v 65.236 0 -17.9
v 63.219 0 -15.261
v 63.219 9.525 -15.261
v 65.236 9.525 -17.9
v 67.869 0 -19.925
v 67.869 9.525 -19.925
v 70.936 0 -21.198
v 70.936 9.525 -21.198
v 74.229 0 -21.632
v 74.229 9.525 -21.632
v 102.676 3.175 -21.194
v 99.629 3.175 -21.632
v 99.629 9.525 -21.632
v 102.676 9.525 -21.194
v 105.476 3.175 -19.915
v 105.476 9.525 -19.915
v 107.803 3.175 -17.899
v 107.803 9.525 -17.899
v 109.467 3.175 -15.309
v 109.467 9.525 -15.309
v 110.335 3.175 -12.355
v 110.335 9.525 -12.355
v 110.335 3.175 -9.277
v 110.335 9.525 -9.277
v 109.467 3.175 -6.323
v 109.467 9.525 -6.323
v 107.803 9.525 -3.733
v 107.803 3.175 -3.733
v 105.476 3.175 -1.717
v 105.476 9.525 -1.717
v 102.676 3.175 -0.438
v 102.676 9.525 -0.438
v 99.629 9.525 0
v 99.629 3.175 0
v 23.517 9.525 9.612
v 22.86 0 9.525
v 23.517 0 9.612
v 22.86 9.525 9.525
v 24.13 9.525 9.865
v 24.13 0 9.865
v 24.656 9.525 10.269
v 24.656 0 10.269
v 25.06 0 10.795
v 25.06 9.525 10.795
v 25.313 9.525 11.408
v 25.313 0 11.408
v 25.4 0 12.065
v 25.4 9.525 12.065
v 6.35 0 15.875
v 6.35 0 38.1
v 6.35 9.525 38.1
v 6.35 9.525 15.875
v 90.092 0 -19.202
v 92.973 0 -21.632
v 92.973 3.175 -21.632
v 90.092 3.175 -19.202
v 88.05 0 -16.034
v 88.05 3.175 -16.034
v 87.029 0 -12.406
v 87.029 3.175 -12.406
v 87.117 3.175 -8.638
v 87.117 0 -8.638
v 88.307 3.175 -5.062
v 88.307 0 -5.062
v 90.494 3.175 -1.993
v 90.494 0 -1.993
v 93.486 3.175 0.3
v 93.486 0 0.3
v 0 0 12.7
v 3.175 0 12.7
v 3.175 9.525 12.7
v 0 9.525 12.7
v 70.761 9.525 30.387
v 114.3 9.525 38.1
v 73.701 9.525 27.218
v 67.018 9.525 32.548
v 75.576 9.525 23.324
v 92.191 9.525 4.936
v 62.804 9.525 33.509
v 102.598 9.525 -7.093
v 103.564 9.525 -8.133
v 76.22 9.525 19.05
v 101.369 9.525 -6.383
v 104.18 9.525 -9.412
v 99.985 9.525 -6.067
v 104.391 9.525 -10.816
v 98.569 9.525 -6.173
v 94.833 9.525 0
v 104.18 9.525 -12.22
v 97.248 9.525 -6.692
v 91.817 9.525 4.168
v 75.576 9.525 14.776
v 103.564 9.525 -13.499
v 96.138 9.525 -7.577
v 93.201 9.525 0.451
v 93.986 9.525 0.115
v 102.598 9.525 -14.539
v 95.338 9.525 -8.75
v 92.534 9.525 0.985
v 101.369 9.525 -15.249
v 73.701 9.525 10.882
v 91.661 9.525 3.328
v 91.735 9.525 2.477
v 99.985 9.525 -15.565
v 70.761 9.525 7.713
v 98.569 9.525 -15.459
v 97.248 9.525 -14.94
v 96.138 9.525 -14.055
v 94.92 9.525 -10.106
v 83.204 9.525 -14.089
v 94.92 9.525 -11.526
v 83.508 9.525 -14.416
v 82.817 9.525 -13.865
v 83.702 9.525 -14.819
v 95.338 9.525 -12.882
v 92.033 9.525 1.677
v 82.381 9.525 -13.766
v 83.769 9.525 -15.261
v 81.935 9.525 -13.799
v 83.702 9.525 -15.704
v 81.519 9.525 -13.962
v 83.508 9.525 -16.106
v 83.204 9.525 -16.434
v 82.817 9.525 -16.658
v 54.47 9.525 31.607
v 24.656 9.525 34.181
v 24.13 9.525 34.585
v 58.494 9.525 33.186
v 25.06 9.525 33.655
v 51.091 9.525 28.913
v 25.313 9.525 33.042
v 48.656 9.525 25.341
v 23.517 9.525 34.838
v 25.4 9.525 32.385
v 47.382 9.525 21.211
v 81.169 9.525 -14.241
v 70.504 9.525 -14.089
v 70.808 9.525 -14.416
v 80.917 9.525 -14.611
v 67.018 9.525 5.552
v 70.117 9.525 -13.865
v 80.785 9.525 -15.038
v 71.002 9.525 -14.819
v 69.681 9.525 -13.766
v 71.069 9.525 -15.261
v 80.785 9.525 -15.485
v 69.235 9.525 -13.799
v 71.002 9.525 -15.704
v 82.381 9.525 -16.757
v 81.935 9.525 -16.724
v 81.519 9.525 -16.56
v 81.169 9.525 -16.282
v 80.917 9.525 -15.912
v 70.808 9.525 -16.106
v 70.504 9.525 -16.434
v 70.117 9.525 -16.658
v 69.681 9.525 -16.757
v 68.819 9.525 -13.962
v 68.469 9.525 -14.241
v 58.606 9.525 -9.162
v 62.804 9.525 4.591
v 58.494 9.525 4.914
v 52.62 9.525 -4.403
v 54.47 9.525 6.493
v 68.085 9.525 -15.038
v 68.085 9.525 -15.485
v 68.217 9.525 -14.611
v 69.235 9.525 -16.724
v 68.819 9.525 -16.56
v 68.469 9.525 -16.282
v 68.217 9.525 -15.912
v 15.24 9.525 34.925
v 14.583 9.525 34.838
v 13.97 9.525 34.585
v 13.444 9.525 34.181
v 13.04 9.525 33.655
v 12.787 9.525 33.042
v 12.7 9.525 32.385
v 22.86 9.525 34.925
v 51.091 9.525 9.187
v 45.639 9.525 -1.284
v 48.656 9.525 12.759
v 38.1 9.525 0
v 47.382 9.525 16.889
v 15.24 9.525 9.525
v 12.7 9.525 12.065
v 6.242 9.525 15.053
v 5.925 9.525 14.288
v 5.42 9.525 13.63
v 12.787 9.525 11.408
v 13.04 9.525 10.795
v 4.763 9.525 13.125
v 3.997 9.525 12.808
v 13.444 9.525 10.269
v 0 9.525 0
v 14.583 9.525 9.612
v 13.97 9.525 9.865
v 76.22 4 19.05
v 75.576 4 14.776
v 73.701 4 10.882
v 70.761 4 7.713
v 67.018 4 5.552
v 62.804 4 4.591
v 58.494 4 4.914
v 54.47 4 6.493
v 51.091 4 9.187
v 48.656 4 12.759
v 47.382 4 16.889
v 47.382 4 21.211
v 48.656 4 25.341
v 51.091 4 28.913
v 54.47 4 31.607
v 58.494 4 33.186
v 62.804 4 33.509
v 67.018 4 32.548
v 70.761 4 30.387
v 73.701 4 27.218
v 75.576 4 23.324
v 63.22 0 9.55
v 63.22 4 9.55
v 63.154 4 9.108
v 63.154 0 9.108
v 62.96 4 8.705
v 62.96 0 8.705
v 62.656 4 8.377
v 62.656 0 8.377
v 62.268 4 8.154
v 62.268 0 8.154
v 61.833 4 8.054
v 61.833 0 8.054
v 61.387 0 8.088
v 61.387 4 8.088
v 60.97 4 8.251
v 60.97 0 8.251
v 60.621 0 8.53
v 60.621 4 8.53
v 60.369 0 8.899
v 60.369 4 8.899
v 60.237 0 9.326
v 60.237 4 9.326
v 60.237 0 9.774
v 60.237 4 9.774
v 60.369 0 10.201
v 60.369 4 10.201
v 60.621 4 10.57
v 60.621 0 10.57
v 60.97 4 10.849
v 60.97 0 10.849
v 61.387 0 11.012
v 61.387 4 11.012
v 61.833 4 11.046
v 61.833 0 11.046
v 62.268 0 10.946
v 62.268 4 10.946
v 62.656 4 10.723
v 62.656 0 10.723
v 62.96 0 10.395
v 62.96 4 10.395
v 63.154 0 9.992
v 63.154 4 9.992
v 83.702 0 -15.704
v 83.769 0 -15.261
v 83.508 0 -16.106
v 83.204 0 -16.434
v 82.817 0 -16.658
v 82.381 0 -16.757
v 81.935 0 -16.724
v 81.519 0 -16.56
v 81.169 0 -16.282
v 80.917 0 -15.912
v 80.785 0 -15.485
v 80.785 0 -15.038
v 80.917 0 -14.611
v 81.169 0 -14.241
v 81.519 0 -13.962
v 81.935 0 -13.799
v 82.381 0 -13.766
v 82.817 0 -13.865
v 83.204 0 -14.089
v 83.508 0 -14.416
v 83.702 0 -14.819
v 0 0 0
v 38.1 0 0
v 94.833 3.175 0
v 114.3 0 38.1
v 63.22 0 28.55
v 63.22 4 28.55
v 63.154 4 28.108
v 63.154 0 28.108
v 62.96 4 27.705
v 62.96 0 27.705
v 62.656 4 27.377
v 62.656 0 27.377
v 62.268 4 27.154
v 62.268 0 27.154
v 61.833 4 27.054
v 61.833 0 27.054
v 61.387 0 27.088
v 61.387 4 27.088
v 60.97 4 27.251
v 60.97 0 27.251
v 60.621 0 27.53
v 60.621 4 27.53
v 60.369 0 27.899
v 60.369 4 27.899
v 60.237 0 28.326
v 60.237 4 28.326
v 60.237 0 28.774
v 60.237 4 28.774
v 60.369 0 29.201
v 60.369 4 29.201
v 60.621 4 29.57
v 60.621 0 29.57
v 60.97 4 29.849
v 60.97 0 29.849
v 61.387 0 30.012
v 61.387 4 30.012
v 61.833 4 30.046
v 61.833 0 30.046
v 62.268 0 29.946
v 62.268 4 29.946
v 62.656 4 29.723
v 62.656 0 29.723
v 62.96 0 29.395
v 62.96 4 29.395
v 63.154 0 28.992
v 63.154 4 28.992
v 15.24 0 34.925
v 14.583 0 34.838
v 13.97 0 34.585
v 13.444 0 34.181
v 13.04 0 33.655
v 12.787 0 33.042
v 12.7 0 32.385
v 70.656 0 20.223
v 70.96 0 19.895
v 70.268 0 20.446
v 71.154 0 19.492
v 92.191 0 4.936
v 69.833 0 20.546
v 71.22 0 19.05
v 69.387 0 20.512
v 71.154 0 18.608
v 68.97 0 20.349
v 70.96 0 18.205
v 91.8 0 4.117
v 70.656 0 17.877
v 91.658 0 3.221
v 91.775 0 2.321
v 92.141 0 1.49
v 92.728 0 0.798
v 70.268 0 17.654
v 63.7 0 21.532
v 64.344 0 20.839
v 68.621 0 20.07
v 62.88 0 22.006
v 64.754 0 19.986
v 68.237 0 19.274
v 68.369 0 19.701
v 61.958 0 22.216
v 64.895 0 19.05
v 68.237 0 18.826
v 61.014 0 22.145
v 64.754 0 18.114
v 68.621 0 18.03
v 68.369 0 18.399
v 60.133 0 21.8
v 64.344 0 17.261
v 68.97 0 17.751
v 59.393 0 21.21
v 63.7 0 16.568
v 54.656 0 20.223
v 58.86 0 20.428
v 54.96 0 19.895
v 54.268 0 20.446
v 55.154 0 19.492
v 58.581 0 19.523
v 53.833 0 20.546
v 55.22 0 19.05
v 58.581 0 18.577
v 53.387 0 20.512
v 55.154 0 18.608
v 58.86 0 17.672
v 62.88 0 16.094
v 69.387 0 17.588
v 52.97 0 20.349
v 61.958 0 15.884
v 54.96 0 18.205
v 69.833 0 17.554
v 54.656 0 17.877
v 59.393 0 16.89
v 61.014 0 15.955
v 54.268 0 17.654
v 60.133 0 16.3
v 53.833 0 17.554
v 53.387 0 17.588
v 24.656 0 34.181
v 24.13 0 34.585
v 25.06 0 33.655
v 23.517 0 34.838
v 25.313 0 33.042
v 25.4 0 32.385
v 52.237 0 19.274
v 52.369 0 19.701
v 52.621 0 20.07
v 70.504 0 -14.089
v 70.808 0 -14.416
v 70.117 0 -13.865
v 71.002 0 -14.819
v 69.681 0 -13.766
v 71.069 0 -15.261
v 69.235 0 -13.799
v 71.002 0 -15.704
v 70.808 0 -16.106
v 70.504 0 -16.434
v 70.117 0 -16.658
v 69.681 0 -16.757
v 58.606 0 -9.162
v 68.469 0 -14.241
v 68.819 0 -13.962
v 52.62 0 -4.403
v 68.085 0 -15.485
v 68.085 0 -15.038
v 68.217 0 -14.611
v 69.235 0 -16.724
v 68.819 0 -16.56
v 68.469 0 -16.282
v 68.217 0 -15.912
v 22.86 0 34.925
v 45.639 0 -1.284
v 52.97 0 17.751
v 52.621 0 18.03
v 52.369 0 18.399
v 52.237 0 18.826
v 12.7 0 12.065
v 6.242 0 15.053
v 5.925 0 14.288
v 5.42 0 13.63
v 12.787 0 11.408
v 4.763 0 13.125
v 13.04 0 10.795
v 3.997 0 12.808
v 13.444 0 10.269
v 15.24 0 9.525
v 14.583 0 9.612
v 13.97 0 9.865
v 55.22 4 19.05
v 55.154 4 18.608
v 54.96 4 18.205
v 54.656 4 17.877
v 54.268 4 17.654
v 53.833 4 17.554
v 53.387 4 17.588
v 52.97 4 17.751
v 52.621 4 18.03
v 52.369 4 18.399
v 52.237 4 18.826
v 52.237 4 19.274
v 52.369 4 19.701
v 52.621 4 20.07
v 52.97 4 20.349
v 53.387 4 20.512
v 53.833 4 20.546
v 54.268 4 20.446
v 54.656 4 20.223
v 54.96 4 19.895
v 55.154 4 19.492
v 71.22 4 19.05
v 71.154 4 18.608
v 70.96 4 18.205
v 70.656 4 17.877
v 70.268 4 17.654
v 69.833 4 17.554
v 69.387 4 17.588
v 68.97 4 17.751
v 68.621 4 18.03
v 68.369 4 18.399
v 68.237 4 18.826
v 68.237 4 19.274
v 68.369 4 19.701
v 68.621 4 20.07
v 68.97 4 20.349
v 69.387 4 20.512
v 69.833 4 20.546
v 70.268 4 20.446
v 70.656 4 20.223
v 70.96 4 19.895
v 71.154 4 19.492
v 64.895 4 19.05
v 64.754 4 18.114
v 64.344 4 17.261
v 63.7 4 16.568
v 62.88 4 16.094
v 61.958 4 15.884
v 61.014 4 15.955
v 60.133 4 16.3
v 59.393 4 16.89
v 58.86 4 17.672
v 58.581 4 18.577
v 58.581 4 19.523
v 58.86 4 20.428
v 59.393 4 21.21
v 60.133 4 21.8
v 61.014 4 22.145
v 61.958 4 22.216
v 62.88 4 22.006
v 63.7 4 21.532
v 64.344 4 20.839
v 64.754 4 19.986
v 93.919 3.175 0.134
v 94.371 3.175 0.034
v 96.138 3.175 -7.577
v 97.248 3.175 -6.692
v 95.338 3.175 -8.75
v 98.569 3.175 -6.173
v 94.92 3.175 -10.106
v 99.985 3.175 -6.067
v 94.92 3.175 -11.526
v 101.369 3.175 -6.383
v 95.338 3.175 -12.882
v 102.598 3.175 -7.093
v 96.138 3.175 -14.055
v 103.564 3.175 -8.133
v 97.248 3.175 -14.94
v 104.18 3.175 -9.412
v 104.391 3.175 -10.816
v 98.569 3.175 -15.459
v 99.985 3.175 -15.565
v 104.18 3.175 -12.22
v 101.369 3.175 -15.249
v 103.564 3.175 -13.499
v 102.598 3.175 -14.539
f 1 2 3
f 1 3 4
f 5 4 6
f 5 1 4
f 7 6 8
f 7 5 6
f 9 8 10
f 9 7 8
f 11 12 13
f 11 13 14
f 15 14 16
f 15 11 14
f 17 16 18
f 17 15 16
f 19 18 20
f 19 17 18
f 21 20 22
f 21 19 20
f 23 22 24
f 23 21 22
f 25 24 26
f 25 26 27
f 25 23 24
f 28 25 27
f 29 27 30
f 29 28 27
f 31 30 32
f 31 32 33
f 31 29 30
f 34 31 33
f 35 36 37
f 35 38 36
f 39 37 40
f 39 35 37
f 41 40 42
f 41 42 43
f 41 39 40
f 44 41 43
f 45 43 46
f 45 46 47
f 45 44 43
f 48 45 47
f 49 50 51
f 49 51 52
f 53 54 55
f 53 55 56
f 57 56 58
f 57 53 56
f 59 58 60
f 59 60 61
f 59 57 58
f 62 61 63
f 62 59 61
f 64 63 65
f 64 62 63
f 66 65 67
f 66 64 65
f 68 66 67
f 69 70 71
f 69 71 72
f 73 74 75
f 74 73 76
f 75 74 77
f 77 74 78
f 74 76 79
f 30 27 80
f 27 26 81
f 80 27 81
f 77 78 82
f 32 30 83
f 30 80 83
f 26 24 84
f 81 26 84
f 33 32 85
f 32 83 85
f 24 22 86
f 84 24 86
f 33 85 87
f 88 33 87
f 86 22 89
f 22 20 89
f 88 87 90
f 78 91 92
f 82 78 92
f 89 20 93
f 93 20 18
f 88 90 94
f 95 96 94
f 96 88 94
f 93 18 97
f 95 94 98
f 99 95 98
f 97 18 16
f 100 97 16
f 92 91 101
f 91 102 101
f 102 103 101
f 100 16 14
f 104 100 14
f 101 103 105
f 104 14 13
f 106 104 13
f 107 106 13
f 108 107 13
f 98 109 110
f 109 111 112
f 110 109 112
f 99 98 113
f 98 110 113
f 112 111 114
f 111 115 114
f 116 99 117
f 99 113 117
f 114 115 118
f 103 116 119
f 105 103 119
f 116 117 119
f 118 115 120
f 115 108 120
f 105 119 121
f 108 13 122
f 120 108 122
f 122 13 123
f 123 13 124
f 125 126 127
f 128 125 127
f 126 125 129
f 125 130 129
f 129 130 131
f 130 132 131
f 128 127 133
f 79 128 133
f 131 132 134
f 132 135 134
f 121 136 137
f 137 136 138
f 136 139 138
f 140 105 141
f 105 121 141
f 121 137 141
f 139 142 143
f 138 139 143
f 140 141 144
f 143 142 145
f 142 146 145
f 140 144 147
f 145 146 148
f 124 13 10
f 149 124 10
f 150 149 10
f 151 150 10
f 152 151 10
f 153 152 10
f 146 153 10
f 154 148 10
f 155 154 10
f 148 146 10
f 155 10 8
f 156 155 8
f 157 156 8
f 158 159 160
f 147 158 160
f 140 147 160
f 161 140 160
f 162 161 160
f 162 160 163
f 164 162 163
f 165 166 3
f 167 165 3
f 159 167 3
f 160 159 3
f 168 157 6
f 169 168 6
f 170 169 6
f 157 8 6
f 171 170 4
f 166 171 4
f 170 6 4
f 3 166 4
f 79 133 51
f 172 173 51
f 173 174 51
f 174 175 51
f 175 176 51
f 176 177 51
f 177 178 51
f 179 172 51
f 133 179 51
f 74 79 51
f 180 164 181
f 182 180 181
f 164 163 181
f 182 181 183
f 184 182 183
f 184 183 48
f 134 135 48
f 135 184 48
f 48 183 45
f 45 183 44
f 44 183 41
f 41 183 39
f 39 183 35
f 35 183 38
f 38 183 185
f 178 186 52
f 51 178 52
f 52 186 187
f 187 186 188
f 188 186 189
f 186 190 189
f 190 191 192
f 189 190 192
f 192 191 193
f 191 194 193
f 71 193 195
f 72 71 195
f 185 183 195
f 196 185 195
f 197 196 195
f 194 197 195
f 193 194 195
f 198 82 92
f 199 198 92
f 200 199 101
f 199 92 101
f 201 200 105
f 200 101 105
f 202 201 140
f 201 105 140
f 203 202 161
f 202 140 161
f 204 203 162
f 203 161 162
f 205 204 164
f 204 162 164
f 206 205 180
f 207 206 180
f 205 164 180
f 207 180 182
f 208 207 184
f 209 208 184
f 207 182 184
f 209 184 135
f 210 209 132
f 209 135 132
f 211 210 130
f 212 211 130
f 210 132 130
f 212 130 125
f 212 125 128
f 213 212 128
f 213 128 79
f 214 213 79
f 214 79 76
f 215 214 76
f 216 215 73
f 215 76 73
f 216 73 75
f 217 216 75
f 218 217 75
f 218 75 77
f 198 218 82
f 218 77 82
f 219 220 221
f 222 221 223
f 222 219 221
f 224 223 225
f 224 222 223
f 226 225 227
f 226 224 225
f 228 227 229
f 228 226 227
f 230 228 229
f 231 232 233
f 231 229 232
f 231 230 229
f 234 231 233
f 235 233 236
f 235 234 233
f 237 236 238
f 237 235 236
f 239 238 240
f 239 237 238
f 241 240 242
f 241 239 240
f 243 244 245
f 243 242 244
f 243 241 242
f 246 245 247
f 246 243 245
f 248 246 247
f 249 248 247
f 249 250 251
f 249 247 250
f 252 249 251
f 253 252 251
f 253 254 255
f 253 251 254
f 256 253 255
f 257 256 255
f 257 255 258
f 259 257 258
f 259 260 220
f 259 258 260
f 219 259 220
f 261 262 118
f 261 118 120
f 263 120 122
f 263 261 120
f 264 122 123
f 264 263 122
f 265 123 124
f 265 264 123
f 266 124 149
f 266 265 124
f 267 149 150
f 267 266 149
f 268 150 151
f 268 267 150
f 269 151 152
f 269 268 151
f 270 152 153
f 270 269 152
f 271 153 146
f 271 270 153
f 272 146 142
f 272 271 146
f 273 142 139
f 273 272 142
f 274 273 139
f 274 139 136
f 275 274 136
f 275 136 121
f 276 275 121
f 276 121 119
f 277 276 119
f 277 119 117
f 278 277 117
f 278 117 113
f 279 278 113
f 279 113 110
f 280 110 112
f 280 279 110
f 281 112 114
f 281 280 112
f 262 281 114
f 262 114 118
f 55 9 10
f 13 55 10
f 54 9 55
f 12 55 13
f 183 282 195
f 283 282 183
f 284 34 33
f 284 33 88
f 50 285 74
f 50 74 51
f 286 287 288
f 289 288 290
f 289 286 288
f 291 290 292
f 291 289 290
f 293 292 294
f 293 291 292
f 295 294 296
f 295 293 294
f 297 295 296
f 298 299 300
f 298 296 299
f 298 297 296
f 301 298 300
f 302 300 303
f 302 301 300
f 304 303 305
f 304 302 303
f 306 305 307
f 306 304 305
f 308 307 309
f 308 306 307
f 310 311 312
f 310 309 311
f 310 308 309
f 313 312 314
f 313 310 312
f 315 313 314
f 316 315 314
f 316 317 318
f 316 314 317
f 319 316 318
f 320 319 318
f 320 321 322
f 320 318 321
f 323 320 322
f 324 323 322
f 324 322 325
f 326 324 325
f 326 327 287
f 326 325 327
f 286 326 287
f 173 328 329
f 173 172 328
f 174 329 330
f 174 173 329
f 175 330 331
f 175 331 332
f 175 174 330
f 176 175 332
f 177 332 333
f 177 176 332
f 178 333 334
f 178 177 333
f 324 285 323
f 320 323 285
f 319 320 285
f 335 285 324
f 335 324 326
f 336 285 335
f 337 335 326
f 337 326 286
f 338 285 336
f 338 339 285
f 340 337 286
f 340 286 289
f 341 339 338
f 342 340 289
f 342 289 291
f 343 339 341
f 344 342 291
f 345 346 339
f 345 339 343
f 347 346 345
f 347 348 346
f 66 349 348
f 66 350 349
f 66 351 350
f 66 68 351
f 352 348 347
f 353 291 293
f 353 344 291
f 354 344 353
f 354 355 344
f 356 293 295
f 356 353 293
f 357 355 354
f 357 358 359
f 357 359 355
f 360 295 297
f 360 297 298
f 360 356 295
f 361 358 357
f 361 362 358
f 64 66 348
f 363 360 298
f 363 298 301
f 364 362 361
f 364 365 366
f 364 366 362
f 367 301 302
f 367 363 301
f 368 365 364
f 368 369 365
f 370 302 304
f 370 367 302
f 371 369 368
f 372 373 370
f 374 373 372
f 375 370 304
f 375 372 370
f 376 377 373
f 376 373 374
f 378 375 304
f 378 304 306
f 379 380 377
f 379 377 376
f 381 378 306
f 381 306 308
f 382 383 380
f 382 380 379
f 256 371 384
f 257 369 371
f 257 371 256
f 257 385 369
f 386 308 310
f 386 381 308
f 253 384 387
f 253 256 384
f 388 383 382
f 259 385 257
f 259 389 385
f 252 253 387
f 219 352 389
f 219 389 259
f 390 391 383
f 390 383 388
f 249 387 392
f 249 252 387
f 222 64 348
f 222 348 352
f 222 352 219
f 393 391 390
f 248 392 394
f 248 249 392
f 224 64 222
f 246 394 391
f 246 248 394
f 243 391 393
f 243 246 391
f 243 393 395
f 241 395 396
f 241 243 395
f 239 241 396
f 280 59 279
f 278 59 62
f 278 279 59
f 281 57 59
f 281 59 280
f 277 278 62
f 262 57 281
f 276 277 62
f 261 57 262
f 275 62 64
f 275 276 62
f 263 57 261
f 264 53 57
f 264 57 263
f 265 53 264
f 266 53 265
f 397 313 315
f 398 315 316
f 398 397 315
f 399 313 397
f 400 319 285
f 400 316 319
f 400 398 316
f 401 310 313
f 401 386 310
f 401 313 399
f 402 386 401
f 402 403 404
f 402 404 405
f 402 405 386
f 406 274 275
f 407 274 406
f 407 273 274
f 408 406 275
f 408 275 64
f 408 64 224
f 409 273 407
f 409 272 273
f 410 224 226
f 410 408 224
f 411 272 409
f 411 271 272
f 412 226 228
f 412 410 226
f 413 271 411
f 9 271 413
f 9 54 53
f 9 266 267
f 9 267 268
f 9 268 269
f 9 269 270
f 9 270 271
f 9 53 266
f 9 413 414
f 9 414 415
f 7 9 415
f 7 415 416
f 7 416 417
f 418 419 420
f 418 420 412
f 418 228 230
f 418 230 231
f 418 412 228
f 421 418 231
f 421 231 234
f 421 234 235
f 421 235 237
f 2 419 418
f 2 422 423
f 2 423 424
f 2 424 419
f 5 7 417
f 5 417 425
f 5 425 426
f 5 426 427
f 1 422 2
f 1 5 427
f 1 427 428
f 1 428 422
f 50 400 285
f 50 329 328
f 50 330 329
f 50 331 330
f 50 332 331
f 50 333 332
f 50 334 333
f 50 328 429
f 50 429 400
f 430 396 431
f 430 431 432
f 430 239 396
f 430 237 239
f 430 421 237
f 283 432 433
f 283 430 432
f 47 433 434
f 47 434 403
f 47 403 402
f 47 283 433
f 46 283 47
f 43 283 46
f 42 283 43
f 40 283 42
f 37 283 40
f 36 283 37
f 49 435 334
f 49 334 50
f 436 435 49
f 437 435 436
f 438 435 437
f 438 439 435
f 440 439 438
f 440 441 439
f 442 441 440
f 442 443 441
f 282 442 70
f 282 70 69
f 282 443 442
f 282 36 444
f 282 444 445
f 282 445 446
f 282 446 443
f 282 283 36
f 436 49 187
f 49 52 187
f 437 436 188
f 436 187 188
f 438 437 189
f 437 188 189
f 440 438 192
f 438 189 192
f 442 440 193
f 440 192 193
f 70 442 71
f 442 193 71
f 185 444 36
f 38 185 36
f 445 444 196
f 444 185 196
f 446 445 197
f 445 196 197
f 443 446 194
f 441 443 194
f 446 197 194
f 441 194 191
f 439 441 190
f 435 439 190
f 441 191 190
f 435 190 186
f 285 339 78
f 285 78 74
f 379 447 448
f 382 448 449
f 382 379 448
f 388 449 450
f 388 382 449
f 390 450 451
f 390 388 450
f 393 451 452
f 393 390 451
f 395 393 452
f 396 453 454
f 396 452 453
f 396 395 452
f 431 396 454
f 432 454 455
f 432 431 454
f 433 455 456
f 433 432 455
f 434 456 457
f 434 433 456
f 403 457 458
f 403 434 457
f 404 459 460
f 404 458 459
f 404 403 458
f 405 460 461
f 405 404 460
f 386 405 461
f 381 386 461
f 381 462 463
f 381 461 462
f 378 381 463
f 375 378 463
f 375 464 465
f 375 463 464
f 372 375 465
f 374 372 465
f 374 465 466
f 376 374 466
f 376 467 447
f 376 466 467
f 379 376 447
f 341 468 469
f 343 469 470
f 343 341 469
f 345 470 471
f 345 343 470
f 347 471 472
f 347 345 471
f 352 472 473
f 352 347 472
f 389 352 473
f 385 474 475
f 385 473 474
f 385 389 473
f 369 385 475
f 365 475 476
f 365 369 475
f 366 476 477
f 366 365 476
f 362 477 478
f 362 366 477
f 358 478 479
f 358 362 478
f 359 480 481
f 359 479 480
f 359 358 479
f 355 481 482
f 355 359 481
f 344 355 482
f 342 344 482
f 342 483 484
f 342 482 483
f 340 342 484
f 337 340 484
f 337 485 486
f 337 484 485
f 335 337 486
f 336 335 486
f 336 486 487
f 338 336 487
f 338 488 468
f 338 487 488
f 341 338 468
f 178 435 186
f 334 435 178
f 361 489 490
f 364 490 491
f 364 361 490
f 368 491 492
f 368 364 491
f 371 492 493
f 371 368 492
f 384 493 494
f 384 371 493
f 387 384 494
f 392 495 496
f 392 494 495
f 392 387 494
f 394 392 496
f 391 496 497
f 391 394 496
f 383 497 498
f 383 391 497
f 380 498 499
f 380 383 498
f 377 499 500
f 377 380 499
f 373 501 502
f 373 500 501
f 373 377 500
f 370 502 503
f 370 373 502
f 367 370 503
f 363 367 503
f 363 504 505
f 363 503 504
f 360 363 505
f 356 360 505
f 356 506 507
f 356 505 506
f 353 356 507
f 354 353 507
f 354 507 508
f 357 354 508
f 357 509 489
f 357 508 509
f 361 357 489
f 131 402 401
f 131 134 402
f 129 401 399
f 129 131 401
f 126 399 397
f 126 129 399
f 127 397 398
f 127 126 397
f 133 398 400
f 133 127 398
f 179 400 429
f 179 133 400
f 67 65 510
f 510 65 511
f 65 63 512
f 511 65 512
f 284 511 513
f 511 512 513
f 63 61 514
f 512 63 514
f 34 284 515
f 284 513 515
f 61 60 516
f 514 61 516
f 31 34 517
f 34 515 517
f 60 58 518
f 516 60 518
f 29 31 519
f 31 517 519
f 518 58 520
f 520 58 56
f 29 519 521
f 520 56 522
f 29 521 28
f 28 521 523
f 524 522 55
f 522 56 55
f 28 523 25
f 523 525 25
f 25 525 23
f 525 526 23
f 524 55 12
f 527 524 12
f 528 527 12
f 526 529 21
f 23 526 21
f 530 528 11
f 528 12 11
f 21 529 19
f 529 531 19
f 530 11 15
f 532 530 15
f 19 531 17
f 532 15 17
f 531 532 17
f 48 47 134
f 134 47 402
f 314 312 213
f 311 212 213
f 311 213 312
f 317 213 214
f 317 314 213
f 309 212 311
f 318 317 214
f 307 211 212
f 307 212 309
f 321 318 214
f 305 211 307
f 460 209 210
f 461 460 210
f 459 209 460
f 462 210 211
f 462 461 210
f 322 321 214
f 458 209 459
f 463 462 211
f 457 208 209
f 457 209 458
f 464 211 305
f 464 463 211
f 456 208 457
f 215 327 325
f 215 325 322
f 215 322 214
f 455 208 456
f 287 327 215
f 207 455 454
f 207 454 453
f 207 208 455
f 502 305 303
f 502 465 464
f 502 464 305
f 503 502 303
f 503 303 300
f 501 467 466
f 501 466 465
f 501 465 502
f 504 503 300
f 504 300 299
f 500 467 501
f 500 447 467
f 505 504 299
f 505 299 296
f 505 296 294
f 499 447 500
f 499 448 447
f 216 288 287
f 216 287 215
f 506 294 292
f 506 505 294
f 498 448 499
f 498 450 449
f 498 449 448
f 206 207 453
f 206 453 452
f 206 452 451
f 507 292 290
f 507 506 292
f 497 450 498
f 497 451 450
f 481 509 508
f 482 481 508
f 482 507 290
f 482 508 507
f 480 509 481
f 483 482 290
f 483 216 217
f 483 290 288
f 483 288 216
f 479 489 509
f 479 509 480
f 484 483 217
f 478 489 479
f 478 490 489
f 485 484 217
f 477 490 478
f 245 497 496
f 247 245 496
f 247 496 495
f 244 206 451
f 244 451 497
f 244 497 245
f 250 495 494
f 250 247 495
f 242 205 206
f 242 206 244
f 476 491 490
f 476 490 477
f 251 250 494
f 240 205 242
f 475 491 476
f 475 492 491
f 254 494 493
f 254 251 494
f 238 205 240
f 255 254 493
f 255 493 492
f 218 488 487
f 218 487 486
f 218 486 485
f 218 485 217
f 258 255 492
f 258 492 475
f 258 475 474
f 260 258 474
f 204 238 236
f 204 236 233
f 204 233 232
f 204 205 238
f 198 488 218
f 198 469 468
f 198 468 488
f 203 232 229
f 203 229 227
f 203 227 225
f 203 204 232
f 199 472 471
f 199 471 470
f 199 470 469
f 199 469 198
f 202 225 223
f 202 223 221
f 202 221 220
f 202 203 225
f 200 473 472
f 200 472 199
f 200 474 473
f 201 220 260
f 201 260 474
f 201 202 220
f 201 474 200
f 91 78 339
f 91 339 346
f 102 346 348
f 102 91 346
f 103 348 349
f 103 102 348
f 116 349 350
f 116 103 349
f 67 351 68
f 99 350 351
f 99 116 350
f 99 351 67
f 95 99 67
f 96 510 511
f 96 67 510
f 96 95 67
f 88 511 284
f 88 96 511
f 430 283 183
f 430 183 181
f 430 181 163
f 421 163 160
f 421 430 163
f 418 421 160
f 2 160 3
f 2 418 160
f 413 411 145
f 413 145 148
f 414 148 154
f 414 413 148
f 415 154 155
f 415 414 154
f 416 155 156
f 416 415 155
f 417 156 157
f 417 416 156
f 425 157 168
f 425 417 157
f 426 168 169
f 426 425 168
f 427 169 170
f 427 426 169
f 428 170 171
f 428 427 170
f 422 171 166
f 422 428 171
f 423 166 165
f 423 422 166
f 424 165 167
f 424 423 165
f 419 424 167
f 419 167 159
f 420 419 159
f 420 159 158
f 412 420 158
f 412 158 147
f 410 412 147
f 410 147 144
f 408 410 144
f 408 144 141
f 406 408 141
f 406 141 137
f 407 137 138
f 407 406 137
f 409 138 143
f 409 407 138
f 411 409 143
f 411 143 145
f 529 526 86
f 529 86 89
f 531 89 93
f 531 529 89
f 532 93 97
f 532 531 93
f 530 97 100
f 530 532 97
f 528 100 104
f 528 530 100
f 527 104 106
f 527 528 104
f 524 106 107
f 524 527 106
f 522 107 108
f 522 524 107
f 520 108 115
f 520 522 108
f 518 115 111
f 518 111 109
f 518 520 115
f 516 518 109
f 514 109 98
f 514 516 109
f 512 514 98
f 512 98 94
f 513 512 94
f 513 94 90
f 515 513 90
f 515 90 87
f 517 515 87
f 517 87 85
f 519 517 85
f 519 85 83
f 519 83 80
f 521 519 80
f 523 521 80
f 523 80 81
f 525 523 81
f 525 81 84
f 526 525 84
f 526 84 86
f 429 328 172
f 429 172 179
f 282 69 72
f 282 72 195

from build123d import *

# Parameters (mm, degrees)
SKETCH1_R           = 4.7625
SKETCH1_R_2         = 1.5
SKETCH1_R_3         = 3.175
BOSS_EXTRUDE1_DEPTH = 9.525
FILLET1_R           = 3.175
FILLET2_R           = 3.175
SKETCH2_R           = 14.5
CUT_EXTRUDE1_DEPTH  = 5.525
SKETCH3_R           = 12.7
CUT_EXTRUDE2_DEPTH  = 3.175
SKETCH4_W           = 12.7
SKETCH4_H           = 25.4
CUT_EXTRUDE3_DEPTH  = 10.525
FILLET3_R           = 2.54


with BuildPart() as part:
    # Sketch1 → Boss-Extrude1 (new body)
    with BuildSketch(Plane(origin=(0, 0, 0), x_dir=(1, 0, 0), z_dir=(0, 1, 0))):
        with BuildLine():
            Line((0, 0), (38.1, 0))
            ThreePointArc((38.1, 0), (52.620300687, 4.403064286), (63.218539249, 15.261399634))
            ThreePointArc((63.218539249, 15.261399634), (67.86863694, 19.924564568), (74.228922018, 21.631986448))
            Line((74.228922018, 21.631986448), (99.628922018, 21.631986448))
            ThreePointArc((99.628922018, 21.631986448), (110.444915242, 10.815993224), (99.628922018, 0))
            Line((99.628922018, 0), (88.9, 0))
            Line((88.9, 0), (114.3, -38.1))
            Line((114.3, -38.1), (6.35, -38.1))
            Line((6.35, -38.1), (6.35, -12.7))
            Line((6.35, -12.7), (0, -12.7))
            Line((0, -12.7), (0, 0))
        make_face()
        with Locations((99.628922018, 10.815993224)):
            Circle(SKETCH1_R, mode=Mode.SUBTRACT)
        with Locations((69.568539249, 15.261399634)):
            Circle(SKETCH1_R_2, mode=Mode.SUBTRACT)
        with Locations((82.268539249, 15.261399634)):
            Circle(SKETCH1_R_2, mode=Mode.SUBTRACT)
        with Locations((69.720479044, -19.05)):
            Circle(SKETCH1_R_2, mode=Mode.SUBTRACT)
        with Locations((61.720479044, -28.55)):
            Circle(SKETCH1_R_2, mode=Mode.SUBTRACT)
        with Locations((53.720479044, -19.05)):
            Circle(SKETCH1_R_2, mode=Mode.SUBTRACT)
        with Locations((61.720479044, -9.55)):
            Circle(SKETCH1_R_2, mode=Mode.SUBTRACT)
        with Locations((61.720479044, -19.05)):
            Circle(SKETCH1_R_3, mode=Mode.SUBTRACT)
    extrude(amount=BOSS_EXTRUDE1_DEPTH)

    # Fillet1
    fillet1_edges = [part.edges().sort_by_distance(p)[0] for p in [
        (88.9, 4.7625, 0),
    ]]
    fillet(fillet1_edges, radius=FILLET1_R)

    # Fillet2
    fillet2_edges = [part.edges().sort_by_distance(p)[0] for p in [
        (6.35, 4.7625, 12.7),
    ]]
    fillet(fillet2_edges, radius=FILLET2_R)

    # Sketch2 → Cut-Extrude1 (cut)
    with BuildSketch(Plane(origin=(0, 9.525, 0), x_dir=(1, 0, 0), z_dir=(0, 1, 0))):
        with Locations((61.720479044, -19.05)):
            Circle(SKETCH2_R)
    extrude(amount=-CUT_EXTRUDE1_DEPTH, mode=Mode.SUBTRACT)

    # Sketch3 → Cut-Extrude2 (cut)
    with BuildSketch(Plane(origin=(0, 0, 0), x_dir=(1, 0, 0), z_dir=(0, 1, 0))):
        with Locations((99.628922018, 10.815993224)):
            Circle(SKETCH3_R)
    extrude(amount=CUT_EXTRUDE2_DEPTH, mode=Mode.SUBTRACT)

    # Sketch4 → Cut-Extrude3 (cut, through all)
    with BuildSketch(Plane.XZ):
        with Locations((19.05, 22.225)):
            Rectangle(SKETCH4_W, SKETCH4_H)
    extrude(amount=-CUT_EXTRUDE3_DEPTH, mode=Mode.SUBTRACT)

    # Fillet3
    fillet3_edges = [part.edges().sort_by_distance(p)[0] for p in [
        (12.7, 4.7625, 34.925),
        (25.4, 4.7625, 34.925),
        (25.4, 4.7625, 9.525),
        (12.7, 4.7625, 9.525),
    ]]
    fillet(fillet3_edges, radius=FILLET3_R)


solid = part.part
